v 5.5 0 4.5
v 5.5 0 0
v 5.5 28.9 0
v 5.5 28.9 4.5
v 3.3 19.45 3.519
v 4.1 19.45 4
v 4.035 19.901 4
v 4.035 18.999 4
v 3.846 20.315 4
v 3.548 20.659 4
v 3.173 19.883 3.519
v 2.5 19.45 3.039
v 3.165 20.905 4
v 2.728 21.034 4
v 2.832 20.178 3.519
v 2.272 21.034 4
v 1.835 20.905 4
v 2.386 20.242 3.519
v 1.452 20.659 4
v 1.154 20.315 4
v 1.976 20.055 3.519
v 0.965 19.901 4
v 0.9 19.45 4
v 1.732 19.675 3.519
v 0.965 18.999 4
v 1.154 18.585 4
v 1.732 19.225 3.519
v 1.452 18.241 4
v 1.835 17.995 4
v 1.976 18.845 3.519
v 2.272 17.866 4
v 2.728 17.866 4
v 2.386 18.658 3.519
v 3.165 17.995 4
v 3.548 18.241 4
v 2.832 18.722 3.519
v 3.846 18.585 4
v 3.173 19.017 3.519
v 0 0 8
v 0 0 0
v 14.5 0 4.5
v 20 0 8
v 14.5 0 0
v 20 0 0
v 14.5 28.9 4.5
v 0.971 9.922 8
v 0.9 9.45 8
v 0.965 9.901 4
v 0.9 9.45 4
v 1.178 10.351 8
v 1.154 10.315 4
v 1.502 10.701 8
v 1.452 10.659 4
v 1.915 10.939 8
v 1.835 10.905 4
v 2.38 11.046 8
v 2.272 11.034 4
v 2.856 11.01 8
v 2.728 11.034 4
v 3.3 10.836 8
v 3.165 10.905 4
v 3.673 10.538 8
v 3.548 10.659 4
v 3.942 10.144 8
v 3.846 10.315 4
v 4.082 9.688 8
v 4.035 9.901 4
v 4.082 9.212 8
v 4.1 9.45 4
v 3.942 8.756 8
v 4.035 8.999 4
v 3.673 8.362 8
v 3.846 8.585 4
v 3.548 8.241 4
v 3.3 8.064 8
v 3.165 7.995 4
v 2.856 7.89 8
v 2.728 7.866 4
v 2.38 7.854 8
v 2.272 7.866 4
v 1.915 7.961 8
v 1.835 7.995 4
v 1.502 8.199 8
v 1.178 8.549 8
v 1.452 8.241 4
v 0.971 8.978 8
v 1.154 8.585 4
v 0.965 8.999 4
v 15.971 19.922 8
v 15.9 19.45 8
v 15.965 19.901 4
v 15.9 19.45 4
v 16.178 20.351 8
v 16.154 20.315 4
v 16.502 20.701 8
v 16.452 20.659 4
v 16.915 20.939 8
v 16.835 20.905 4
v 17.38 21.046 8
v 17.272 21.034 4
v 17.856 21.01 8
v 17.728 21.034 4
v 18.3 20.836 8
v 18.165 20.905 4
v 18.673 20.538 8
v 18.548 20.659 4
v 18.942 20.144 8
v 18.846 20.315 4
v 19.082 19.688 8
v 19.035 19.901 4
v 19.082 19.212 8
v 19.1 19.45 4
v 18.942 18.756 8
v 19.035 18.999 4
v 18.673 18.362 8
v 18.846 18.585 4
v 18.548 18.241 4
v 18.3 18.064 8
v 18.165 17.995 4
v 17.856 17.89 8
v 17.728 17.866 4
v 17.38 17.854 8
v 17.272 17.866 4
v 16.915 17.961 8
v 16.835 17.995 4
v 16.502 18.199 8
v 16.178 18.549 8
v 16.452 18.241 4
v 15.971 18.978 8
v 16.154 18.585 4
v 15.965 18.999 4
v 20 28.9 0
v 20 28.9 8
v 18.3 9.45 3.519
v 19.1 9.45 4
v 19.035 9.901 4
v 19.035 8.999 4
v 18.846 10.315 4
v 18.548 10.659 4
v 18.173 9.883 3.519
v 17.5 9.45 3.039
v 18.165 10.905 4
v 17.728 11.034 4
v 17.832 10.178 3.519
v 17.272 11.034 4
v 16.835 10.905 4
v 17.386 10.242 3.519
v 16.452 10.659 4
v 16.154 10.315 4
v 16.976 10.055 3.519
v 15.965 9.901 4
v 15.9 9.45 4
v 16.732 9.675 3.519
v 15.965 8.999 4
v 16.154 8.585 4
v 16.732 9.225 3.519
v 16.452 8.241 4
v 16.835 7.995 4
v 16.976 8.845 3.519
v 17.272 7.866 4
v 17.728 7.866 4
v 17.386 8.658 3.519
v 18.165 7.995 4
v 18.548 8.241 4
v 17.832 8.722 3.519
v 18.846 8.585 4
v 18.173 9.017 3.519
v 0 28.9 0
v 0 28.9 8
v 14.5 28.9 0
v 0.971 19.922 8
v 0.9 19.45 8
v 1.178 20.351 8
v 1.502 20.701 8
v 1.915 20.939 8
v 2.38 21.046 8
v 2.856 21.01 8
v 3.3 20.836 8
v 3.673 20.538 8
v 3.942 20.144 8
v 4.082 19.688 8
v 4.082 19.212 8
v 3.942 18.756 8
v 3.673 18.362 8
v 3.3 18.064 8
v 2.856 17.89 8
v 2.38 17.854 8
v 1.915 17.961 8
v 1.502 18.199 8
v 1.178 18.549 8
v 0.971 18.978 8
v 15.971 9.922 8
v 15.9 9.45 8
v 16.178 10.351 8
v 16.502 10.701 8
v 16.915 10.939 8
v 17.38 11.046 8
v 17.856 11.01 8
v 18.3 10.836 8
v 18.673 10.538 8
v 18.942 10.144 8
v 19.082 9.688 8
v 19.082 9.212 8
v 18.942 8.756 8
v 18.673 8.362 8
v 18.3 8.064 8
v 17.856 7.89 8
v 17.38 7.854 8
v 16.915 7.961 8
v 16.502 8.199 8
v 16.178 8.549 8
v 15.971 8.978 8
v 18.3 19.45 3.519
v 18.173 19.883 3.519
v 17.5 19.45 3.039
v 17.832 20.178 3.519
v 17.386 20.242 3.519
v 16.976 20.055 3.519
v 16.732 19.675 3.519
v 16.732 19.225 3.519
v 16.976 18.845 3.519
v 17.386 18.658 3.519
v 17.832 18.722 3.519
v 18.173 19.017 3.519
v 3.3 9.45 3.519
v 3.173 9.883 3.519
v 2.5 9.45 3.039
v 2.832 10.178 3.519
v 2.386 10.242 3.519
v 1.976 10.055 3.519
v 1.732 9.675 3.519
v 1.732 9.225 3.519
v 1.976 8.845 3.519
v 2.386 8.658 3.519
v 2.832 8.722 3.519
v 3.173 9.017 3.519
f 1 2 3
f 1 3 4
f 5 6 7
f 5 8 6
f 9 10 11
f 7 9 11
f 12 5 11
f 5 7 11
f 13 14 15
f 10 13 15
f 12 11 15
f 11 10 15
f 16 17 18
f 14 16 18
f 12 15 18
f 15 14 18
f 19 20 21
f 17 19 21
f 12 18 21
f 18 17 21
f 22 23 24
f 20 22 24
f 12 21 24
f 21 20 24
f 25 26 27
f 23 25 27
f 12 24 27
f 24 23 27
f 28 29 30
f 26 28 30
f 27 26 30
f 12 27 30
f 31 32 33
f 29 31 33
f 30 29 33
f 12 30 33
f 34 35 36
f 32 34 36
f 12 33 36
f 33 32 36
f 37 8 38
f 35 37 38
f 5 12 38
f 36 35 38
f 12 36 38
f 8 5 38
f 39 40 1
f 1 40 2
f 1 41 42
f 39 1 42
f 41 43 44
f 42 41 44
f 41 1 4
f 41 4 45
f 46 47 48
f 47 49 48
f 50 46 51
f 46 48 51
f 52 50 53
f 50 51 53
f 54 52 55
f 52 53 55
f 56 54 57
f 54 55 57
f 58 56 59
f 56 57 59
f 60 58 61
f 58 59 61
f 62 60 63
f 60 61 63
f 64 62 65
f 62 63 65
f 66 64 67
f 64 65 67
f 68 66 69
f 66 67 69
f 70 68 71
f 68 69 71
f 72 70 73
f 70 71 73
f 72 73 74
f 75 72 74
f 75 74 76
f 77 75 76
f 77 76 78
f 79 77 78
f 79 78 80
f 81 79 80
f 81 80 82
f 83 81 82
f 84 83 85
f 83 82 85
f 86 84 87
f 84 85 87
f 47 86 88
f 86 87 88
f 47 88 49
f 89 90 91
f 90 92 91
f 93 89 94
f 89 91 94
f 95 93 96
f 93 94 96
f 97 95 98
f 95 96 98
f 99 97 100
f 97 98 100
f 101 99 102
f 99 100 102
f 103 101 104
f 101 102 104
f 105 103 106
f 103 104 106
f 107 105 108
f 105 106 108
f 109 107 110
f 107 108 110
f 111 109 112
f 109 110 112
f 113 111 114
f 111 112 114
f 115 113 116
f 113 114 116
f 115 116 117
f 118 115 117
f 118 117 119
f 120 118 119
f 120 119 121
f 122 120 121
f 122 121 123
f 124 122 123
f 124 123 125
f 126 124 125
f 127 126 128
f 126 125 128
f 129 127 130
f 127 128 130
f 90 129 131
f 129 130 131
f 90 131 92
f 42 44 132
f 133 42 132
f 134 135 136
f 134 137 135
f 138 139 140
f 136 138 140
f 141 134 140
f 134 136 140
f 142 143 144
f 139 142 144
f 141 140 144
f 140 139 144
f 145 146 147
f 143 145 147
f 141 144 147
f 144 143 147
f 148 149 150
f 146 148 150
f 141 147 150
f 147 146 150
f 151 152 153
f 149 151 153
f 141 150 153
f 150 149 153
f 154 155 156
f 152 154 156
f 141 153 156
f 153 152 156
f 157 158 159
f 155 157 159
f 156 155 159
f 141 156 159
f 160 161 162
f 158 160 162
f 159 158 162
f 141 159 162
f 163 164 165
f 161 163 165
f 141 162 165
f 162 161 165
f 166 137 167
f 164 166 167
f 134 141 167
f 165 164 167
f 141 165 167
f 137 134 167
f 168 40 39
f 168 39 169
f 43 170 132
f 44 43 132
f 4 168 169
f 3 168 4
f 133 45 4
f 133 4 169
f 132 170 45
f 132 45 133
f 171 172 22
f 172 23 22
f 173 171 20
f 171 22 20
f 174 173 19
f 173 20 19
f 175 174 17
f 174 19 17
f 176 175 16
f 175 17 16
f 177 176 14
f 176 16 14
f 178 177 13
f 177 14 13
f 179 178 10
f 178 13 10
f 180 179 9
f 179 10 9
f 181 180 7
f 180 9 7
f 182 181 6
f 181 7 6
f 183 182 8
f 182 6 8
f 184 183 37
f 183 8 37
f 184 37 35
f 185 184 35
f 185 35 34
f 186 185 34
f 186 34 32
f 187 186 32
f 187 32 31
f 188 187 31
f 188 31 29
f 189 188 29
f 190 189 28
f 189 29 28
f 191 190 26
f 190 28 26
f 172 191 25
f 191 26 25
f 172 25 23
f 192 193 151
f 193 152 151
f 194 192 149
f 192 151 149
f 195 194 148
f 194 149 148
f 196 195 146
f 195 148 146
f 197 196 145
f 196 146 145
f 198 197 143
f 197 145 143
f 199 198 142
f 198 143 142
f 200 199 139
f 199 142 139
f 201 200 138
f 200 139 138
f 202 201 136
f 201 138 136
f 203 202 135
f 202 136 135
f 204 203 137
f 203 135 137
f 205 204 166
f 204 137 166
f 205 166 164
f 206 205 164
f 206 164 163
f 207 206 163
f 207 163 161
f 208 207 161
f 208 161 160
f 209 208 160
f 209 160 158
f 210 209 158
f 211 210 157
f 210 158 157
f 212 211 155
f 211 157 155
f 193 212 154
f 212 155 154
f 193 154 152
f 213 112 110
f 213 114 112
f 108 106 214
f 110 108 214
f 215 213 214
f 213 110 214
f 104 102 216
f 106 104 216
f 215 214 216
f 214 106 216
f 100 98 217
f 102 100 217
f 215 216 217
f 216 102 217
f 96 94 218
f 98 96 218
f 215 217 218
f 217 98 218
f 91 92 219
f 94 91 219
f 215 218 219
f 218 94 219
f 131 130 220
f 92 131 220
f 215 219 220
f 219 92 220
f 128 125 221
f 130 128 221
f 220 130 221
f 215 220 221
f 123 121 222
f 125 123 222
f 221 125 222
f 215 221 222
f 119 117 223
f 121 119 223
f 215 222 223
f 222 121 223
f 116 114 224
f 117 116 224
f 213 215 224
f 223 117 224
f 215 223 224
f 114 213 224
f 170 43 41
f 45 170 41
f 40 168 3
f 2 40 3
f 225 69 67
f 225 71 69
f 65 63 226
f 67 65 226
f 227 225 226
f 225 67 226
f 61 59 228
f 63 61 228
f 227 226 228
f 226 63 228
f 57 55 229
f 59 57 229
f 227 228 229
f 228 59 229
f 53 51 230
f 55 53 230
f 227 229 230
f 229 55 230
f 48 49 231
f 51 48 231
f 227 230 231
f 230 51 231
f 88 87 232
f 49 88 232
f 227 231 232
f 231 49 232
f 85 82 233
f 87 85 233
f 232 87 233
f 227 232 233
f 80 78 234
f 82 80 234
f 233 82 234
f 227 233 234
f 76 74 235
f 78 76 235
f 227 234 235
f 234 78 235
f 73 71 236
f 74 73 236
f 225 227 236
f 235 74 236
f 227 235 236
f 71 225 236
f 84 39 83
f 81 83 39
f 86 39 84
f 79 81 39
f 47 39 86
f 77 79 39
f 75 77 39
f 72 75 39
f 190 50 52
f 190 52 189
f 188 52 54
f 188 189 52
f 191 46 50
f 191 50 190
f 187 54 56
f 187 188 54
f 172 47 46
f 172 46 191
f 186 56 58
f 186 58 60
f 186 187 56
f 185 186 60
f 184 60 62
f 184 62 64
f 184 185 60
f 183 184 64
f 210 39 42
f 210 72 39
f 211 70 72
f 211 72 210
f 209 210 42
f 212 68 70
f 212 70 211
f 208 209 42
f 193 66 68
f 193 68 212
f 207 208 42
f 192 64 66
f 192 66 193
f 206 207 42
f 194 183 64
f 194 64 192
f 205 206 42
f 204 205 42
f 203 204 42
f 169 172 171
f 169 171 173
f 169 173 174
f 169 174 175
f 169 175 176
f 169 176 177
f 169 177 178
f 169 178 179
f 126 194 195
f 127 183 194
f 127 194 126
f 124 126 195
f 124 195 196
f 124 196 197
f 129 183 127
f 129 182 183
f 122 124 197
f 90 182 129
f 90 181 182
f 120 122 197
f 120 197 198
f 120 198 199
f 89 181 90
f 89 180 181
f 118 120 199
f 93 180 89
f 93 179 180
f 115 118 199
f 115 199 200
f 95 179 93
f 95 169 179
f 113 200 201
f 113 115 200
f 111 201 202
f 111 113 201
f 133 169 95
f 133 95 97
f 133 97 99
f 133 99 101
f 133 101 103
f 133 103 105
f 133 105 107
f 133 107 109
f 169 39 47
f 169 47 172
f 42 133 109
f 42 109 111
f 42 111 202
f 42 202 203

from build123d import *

# Parameters (mm, degrees)
F0_W     = 20
F0_H     = 28.9
F1_DEPTH = 8
F2_W     = 9
F2_H     = 4.5
F3_DEPTH = 28.901
F5_D     = 3.2
F5_DEPTH = 4
F5_TIP   = 0.9613769904


with BuildPart() as f1:
    # F0 (on Top) → F1 (new body)
    with BuildSketch(Plane.XY):
        with Locations((10, 14.45)):
            Rectangle(F0_W, F0_H)
    extrude(amount=F1_DEPTH)

    # F2 (on face) → F3 (cut, through all)
    with BuildSketch(Plane.XZ):
        with Locations((10, 2.25)):
            Rectangle(F2_W, F2_H)
    extrude(amount=-F3_DEPTH, mode=Mode.SUBTRACT)

    # F5
    with Locations(Plane.XY.offset(8)):
        with Locations((2.5, 9.45), (2.5, 19.45), (17.5, 19.45), (17.5, 9.45)):
            Hole(F5_D / 2, depth=F5_DEPTH)
            with Locations((0, 0, -(F5_DEPTH + F5_TIP / 2))):  # 118° drill point
                Cone(0, F5_D / 2, F5_TIP, mode=Mode.SUBTRACT)


solid = f1.part
